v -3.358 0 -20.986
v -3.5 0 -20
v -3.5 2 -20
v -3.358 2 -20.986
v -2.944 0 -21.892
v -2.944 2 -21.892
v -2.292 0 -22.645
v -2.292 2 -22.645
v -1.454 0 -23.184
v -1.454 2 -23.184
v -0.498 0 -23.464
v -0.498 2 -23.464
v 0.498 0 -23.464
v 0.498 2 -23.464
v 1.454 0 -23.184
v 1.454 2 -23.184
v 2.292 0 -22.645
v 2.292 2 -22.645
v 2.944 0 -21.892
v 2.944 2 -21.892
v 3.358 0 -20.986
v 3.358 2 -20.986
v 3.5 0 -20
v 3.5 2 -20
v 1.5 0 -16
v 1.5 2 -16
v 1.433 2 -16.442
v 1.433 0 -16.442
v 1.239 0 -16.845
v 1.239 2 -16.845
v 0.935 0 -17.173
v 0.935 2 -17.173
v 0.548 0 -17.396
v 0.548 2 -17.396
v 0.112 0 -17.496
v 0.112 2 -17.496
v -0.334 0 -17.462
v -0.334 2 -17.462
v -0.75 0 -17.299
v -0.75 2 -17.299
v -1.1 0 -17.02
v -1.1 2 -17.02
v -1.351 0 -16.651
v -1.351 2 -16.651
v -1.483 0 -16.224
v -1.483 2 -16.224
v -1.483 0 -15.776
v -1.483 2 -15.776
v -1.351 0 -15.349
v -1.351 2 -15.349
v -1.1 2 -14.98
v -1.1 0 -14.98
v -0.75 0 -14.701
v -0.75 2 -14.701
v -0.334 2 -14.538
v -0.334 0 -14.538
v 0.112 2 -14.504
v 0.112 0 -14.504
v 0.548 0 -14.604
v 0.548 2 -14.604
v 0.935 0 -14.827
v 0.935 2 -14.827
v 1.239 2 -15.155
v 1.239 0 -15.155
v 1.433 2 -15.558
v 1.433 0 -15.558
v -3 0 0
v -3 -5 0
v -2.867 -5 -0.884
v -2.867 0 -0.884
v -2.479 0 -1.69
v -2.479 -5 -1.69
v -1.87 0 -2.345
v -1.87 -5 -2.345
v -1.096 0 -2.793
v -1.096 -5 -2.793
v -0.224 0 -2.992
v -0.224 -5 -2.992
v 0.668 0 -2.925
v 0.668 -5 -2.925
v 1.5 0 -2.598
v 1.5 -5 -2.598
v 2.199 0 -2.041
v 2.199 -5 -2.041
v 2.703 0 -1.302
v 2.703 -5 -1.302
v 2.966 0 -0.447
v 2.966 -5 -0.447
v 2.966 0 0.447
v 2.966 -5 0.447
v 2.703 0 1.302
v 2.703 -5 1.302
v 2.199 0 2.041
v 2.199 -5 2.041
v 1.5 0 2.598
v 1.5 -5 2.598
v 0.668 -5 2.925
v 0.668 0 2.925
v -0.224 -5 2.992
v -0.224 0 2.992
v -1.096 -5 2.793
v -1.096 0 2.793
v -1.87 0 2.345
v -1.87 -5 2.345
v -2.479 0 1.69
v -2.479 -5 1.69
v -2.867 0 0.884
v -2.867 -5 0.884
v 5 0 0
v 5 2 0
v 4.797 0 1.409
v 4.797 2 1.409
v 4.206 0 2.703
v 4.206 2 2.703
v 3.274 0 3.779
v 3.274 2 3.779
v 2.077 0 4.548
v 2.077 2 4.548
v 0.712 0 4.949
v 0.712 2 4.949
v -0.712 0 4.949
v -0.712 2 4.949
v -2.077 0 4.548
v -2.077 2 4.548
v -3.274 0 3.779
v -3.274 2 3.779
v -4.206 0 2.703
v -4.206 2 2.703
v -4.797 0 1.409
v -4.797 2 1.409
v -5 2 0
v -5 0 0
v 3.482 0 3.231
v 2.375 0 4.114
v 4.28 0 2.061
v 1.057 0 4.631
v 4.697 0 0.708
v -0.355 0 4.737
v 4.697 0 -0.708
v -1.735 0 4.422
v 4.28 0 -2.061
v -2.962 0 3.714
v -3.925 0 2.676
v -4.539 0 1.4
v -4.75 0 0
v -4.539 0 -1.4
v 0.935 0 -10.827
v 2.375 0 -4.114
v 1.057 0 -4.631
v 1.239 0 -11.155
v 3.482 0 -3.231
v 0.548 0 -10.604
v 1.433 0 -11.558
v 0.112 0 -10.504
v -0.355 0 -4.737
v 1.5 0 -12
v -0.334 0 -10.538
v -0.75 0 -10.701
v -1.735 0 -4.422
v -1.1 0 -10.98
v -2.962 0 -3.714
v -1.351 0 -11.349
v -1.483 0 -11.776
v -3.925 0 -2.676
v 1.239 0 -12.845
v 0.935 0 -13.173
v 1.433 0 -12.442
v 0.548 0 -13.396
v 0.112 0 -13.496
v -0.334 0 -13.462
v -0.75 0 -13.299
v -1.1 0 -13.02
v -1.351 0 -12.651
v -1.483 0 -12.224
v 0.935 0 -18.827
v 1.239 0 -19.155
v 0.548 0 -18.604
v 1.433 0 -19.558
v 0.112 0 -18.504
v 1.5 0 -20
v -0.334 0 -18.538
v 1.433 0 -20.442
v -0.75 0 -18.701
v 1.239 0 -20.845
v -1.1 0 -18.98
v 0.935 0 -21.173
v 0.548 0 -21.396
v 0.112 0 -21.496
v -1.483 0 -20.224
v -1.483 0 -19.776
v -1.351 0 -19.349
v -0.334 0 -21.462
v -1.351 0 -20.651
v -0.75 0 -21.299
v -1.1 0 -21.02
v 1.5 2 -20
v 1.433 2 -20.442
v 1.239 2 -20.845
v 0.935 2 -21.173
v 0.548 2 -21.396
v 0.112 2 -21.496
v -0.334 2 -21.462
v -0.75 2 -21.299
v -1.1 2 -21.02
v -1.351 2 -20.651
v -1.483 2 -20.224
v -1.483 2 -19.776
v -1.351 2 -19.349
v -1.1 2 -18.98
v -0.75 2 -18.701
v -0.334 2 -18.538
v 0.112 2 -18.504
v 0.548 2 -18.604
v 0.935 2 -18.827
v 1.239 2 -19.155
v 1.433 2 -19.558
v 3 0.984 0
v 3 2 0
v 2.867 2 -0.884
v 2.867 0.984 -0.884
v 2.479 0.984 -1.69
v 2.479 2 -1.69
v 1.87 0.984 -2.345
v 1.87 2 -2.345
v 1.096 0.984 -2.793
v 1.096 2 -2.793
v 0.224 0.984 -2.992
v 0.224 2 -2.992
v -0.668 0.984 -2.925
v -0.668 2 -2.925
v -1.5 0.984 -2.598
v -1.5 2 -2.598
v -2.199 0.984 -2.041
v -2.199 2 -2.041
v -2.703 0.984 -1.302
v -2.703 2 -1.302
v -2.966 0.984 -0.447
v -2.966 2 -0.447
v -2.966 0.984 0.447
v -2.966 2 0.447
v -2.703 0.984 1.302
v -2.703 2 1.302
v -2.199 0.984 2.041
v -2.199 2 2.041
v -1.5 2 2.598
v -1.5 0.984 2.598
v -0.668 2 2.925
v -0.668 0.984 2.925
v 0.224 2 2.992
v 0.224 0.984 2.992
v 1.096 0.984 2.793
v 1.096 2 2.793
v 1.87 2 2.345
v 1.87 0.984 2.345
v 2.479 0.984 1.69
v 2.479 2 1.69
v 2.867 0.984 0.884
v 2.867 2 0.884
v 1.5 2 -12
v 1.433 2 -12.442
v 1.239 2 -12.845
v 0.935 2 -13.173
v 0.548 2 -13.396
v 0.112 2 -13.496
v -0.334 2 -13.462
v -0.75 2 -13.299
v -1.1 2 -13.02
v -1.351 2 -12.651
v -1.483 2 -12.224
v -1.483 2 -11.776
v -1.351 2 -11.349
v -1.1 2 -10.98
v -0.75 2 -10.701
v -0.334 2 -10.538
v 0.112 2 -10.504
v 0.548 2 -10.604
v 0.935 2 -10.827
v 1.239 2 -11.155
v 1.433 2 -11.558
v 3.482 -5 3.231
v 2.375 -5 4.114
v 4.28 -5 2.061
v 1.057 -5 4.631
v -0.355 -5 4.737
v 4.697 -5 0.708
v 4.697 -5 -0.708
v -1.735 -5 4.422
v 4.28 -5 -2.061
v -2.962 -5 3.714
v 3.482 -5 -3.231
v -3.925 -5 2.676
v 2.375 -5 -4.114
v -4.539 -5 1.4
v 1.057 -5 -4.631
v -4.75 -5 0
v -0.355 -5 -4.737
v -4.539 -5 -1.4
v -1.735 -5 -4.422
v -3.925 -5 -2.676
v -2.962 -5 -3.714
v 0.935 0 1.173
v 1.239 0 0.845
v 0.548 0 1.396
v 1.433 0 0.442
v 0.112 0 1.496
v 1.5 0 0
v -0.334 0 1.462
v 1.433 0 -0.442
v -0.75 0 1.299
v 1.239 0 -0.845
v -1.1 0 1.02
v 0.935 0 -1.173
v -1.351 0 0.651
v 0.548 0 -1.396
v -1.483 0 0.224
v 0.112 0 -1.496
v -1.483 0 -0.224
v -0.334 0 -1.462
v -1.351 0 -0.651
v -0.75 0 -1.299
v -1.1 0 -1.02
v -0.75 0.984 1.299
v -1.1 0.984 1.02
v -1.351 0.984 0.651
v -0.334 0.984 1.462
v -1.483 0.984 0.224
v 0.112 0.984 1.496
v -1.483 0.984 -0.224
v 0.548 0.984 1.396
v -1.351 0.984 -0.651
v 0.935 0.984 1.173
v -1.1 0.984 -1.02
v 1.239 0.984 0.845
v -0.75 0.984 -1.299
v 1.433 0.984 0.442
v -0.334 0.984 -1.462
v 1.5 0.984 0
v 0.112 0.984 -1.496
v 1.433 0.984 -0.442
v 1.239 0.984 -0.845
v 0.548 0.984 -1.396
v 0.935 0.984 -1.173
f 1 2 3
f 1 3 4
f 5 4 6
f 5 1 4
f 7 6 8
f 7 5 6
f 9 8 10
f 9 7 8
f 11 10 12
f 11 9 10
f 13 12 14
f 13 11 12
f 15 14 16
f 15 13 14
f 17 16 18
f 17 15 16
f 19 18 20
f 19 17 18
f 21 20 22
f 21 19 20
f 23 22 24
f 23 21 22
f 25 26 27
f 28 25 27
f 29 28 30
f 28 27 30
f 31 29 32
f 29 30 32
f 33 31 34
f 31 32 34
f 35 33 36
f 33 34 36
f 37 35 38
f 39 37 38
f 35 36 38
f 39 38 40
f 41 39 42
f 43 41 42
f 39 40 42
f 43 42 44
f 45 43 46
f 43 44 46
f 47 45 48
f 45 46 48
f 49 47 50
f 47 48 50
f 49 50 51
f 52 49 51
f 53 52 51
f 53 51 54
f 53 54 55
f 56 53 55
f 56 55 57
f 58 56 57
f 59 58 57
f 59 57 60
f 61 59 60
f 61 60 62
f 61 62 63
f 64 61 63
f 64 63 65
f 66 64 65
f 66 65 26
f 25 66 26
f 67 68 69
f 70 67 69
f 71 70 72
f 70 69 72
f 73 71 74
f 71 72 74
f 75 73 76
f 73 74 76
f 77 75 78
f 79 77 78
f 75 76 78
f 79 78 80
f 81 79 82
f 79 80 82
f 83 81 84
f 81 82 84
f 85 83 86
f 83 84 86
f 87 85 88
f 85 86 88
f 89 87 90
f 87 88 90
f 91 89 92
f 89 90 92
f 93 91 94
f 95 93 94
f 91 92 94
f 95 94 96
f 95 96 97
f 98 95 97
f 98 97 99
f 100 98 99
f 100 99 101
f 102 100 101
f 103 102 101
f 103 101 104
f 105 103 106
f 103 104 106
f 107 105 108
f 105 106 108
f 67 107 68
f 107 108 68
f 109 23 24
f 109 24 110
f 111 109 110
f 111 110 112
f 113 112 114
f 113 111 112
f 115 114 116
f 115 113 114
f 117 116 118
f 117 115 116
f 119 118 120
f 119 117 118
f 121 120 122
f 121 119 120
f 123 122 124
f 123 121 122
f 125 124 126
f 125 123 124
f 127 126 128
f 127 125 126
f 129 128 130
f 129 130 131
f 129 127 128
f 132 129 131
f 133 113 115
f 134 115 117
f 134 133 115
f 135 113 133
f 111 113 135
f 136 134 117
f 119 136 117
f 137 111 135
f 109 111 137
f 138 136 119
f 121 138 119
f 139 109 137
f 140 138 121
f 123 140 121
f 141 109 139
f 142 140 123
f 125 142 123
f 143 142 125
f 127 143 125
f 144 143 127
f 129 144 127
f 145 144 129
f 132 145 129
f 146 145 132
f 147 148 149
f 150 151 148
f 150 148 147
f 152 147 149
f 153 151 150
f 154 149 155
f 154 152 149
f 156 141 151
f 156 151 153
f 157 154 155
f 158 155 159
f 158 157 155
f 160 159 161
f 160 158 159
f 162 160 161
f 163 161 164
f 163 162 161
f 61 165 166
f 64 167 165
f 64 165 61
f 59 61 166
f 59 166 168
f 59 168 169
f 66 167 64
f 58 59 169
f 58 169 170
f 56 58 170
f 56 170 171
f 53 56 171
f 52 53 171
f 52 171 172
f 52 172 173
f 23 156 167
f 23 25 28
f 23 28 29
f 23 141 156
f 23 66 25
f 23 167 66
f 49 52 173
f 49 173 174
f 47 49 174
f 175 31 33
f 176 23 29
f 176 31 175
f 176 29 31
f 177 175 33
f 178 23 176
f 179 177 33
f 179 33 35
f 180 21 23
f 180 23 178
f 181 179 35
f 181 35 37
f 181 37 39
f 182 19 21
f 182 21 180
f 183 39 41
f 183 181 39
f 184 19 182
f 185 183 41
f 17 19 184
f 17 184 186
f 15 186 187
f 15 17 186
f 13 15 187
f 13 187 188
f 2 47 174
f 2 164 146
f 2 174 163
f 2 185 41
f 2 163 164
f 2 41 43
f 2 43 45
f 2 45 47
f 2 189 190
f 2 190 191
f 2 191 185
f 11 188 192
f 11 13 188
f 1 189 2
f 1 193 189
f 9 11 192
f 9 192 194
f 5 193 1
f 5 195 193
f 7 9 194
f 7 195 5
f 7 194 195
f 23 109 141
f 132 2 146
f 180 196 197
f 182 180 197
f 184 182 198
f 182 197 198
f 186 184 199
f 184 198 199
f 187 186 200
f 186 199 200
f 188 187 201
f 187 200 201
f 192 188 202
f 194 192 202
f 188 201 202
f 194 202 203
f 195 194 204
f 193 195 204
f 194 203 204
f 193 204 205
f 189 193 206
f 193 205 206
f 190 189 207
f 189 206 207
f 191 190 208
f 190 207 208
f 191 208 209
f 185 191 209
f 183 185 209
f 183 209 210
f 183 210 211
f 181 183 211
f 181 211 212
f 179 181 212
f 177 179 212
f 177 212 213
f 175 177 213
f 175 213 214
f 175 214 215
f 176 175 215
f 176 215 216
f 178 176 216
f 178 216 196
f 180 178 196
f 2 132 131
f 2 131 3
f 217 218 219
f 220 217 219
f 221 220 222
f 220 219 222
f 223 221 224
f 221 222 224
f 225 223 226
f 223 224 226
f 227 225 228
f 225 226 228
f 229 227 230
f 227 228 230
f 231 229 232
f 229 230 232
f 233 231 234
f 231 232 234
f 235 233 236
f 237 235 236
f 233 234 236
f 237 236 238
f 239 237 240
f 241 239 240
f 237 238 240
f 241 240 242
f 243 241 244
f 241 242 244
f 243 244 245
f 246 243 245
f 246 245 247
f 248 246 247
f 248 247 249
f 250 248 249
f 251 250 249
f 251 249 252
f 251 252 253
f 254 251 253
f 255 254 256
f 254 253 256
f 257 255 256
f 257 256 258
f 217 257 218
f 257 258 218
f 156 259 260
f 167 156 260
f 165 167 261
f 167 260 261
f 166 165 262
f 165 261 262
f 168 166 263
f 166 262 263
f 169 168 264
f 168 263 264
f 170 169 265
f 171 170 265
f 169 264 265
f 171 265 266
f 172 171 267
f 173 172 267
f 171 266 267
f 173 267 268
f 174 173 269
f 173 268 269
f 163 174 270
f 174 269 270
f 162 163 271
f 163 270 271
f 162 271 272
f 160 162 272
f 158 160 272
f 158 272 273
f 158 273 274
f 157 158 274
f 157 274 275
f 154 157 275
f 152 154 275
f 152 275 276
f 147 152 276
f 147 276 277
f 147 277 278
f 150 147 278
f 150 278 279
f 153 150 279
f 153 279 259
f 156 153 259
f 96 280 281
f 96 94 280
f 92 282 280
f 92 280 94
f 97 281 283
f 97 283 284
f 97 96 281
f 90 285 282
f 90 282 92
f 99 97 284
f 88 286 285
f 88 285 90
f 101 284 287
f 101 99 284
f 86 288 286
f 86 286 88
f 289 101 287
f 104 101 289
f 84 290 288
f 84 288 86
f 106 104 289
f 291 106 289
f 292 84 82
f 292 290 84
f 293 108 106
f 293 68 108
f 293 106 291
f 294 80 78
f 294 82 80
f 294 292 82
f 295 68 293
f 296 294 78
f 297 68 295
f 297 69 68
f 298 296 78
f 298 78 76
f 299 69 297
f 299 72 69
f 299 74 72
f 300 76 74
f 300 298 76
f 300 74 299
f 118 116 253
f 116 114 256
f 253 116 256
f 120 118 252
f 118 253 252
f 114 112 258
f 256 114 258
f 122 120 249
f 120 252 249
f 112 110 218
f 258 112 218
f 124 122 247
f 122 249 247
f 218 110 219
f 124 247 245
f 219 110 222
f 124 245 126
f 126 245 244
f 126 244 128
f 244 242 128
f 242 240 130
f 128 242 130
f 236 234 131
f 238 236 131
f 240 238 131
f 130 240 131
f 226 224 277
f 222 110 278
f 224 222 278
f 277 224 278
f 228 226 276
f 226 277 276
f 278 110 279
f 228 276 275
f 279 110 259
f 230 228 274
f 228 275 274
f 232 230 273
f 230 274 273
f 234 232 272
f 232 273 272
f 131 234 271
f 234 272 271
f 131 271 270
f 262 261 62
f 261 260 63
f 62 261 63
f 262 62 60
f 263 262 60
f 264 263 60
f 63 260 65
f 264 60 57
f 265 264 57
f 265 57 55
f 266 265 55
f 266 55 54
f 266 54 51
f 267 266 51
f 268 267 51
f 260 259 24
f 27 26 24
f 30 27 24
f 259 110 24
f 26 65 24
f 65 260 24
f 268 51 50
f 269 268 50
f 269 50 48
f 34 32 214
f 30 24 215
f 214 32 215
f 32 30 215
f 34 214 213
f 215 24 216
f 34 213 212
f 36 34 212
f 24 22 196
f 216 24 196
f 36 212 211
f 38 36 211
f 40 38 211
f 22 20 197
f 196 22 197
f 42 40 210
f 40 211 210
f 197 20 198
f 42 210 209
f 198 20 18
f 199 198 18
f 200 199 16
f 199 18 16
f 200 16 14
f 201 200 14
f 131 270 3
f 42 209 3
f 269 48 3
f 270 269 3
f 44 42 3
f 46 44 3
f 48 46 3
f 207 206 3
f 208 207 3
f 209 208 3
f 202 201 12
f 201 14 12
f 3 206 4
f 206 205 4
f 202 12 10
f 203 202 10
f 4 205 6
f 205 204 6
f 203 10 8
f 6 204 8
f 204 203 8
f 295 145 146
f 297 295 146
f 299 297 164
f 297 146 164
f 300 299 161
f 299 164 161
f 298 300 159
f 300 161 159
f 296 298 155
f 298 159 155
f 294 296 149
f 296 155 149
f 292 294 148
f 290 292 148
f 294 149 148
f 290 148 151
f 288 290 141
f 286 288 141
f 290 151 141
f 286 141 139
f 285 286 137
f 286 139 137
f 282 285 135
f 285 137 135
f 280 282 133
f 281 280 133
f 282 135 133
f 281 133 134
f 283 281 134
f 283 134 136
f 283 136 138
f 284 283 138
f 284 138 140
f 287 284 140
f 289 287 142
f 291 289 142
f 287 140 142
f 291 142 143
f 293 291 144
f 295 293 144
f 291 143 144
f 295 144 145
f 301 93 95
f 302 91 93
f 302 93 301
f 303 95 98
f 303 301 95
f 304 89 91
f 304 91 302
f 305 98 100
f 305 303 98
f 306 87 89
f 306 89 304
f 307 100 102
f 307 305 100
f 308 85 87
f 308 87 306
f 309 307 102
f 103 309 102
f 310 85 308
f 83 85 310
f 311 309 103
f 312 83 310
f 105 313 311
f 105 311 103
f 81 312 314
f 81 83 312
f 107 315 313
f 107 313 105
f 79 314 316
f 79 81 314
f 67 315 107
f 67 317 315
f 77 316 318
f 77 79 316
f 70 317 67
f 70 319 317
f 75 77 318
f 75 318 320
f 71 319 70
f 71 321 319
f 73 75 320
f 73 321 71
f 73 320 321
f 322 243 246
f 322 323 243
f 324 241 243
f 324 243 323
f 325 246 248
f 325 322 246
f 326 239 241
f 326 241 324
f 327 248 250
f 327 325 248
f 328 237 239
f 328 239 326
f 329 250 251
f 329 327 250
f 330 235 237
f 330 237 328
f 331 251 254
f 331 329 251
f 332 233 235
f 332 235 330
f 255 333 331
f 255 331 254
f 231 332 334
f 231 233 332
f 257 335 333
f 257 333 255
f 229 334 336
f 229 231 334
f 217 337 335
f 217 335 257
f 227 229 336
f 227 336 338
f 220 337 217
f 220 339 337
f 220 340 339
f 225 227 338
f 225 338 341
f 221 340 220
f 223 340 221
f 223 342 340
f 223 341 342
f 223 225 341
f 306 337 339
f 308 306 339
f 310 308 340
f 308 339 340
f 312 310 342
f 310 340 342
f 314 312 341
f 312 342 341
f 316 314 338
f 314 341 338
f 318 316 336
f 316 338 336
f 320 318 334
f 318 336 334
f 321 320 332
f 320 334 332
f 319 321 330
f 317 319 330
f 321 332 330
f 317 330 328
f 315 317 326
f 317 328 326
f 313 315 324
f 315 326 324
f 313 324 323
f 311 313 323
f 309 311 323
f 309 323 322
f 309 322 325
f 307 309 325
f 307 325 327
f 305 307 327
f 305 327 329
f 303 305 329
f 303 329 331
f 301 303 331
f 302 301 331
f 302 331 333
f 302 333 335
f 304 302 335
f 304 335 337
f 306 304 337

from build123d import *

# Parameters (mm, degrees)
BOSS_EXTRUDE1_DEPTH = 2
SKETCH2_R           = 1.5
CUT_EXTRUDE1_DEPTH  = 3
SKETCH7_R           = 4.75
BOSS_EXTRUDE2_DEPTH = 5
SKETCH3_R           = 1.5
CUT_EXTRUDE2_DEPTH  = 8
SKETCH4_R           = 3
CUT_EXTRUDE3_DEPTH  = 1.016
SKETCH6_R           = 1.5
CUT_EXTRUDE4_DEPTH  = 8
SKETCH5_R           = 1.5
CUT_EXTRUDE5_DEPTH  = 8
SKETCH8_R           = 3
CUT_EXTRUDE6_DEPTH  = 5


with BuildPart() as part:
    # Sketch1 → Boss-Extrude1 (new body)
    with BuildSketch(Plane(origin=(0, 0, 0), x_dir=(1, 0, 0), z_dir=(0, 1, 0))):
        with BuildLine():
            Line((3.5, 20), (5, 0))
            ThreePointArc((5, 0), (0, -5), (-5, 0))
            Line((-5, 0), (-3.5, 20))
            ThreePointArc((-3.5, 20), (0, 23.5), (3.5, 20))
        make_face()
    extrude(amount=BOSS_EXTRUDE1_DEPTH)

    # Sketch2 → Cut-Extrude1 (cut, through all)
    with BuildSketch(Plane(origin=(0, 2, 0), x_dir=(1, 0, 0), z_dir=(0, 1, 0))):
        with Locations((0, 20)):
            Circle(SKETCH2_R)
    extrude(amount=-CUT_EXTRUDE1_DEPTH, mode=Mode.SUBTRACT)

    # Sketch7 → Boss-Extrude2 (add)
    with BuildSketch(Plane(origin=(0, 0, 0), x_dir=(-1, 0, 0), z_dir=(0, -1, 0))):
        Circle(SKETCH7_R)
    extrude(amount=BOSS_EXTRUDE2_DEPTH)

    # Sketch3 → Cut-Extrude2 (cut, through all)
    with BuildSketch(Plane(origin=(0, 2, 0), x_dir=(1, 0, 0), z_dir=(0, 1, 0))):
        Circle(SKETCH3_R)
    extrude(amount=-CUT_EXTRUDE2_DEPTH, mode=Mode.SUBTRACT)

    # Sketch4 → Cut-Extrude3 (cut)
    with BuildSketch(Plane(origin=(0, 2, 0), x_dir=(1, 0, 0), z_dir=(0, 1, 0))):
        Circle(SKETCH4_R)
    extrude(amount=-CUT_EXTRUDE3_DEPTH, mode=Mode.SUBTRACT)

    # Sketch6 → Cut-Extrude4 (cut, through all)
    with BuildSketch(Plane(origin=(0, 2, 0), x_dir=(1, 0, 0), z_dir=(0, 1, 0))):
        with Locations((0, 16)):
            Circle(SKETCH6_R)
    extrude(amount=-CUT_EXTRUDE4_DEPTH, mode=Mode.SUBTRACT)

    # Sketch5 → Cut-Extrude5 (cut, through all)
    with BuildSketch(Plane(origin=(0, 2, 0), x_dir=(1, 0, 0), z_dir=(0, 1, 0))):
        with Locations((0, 12)):
            Circle(SKETCH5_R)
    extrude(amount=-CUT_EXTRUDE5_DEPTH, mode=Mode.SUBTRACT)

    # Sketch8 → Cut-Extrude6 (cut)
    with BuildSketch(Plane(origin=(0, -5, 0), x_dir=(-1, 0, 0), z_dir=(0, -1, 0))):
        Circle(SKETCH8_R)
    extrude(amount=-CUT_EXTRUDE6_DEPTH, mode=Mode.SUBTRACT)


solid = part.part
